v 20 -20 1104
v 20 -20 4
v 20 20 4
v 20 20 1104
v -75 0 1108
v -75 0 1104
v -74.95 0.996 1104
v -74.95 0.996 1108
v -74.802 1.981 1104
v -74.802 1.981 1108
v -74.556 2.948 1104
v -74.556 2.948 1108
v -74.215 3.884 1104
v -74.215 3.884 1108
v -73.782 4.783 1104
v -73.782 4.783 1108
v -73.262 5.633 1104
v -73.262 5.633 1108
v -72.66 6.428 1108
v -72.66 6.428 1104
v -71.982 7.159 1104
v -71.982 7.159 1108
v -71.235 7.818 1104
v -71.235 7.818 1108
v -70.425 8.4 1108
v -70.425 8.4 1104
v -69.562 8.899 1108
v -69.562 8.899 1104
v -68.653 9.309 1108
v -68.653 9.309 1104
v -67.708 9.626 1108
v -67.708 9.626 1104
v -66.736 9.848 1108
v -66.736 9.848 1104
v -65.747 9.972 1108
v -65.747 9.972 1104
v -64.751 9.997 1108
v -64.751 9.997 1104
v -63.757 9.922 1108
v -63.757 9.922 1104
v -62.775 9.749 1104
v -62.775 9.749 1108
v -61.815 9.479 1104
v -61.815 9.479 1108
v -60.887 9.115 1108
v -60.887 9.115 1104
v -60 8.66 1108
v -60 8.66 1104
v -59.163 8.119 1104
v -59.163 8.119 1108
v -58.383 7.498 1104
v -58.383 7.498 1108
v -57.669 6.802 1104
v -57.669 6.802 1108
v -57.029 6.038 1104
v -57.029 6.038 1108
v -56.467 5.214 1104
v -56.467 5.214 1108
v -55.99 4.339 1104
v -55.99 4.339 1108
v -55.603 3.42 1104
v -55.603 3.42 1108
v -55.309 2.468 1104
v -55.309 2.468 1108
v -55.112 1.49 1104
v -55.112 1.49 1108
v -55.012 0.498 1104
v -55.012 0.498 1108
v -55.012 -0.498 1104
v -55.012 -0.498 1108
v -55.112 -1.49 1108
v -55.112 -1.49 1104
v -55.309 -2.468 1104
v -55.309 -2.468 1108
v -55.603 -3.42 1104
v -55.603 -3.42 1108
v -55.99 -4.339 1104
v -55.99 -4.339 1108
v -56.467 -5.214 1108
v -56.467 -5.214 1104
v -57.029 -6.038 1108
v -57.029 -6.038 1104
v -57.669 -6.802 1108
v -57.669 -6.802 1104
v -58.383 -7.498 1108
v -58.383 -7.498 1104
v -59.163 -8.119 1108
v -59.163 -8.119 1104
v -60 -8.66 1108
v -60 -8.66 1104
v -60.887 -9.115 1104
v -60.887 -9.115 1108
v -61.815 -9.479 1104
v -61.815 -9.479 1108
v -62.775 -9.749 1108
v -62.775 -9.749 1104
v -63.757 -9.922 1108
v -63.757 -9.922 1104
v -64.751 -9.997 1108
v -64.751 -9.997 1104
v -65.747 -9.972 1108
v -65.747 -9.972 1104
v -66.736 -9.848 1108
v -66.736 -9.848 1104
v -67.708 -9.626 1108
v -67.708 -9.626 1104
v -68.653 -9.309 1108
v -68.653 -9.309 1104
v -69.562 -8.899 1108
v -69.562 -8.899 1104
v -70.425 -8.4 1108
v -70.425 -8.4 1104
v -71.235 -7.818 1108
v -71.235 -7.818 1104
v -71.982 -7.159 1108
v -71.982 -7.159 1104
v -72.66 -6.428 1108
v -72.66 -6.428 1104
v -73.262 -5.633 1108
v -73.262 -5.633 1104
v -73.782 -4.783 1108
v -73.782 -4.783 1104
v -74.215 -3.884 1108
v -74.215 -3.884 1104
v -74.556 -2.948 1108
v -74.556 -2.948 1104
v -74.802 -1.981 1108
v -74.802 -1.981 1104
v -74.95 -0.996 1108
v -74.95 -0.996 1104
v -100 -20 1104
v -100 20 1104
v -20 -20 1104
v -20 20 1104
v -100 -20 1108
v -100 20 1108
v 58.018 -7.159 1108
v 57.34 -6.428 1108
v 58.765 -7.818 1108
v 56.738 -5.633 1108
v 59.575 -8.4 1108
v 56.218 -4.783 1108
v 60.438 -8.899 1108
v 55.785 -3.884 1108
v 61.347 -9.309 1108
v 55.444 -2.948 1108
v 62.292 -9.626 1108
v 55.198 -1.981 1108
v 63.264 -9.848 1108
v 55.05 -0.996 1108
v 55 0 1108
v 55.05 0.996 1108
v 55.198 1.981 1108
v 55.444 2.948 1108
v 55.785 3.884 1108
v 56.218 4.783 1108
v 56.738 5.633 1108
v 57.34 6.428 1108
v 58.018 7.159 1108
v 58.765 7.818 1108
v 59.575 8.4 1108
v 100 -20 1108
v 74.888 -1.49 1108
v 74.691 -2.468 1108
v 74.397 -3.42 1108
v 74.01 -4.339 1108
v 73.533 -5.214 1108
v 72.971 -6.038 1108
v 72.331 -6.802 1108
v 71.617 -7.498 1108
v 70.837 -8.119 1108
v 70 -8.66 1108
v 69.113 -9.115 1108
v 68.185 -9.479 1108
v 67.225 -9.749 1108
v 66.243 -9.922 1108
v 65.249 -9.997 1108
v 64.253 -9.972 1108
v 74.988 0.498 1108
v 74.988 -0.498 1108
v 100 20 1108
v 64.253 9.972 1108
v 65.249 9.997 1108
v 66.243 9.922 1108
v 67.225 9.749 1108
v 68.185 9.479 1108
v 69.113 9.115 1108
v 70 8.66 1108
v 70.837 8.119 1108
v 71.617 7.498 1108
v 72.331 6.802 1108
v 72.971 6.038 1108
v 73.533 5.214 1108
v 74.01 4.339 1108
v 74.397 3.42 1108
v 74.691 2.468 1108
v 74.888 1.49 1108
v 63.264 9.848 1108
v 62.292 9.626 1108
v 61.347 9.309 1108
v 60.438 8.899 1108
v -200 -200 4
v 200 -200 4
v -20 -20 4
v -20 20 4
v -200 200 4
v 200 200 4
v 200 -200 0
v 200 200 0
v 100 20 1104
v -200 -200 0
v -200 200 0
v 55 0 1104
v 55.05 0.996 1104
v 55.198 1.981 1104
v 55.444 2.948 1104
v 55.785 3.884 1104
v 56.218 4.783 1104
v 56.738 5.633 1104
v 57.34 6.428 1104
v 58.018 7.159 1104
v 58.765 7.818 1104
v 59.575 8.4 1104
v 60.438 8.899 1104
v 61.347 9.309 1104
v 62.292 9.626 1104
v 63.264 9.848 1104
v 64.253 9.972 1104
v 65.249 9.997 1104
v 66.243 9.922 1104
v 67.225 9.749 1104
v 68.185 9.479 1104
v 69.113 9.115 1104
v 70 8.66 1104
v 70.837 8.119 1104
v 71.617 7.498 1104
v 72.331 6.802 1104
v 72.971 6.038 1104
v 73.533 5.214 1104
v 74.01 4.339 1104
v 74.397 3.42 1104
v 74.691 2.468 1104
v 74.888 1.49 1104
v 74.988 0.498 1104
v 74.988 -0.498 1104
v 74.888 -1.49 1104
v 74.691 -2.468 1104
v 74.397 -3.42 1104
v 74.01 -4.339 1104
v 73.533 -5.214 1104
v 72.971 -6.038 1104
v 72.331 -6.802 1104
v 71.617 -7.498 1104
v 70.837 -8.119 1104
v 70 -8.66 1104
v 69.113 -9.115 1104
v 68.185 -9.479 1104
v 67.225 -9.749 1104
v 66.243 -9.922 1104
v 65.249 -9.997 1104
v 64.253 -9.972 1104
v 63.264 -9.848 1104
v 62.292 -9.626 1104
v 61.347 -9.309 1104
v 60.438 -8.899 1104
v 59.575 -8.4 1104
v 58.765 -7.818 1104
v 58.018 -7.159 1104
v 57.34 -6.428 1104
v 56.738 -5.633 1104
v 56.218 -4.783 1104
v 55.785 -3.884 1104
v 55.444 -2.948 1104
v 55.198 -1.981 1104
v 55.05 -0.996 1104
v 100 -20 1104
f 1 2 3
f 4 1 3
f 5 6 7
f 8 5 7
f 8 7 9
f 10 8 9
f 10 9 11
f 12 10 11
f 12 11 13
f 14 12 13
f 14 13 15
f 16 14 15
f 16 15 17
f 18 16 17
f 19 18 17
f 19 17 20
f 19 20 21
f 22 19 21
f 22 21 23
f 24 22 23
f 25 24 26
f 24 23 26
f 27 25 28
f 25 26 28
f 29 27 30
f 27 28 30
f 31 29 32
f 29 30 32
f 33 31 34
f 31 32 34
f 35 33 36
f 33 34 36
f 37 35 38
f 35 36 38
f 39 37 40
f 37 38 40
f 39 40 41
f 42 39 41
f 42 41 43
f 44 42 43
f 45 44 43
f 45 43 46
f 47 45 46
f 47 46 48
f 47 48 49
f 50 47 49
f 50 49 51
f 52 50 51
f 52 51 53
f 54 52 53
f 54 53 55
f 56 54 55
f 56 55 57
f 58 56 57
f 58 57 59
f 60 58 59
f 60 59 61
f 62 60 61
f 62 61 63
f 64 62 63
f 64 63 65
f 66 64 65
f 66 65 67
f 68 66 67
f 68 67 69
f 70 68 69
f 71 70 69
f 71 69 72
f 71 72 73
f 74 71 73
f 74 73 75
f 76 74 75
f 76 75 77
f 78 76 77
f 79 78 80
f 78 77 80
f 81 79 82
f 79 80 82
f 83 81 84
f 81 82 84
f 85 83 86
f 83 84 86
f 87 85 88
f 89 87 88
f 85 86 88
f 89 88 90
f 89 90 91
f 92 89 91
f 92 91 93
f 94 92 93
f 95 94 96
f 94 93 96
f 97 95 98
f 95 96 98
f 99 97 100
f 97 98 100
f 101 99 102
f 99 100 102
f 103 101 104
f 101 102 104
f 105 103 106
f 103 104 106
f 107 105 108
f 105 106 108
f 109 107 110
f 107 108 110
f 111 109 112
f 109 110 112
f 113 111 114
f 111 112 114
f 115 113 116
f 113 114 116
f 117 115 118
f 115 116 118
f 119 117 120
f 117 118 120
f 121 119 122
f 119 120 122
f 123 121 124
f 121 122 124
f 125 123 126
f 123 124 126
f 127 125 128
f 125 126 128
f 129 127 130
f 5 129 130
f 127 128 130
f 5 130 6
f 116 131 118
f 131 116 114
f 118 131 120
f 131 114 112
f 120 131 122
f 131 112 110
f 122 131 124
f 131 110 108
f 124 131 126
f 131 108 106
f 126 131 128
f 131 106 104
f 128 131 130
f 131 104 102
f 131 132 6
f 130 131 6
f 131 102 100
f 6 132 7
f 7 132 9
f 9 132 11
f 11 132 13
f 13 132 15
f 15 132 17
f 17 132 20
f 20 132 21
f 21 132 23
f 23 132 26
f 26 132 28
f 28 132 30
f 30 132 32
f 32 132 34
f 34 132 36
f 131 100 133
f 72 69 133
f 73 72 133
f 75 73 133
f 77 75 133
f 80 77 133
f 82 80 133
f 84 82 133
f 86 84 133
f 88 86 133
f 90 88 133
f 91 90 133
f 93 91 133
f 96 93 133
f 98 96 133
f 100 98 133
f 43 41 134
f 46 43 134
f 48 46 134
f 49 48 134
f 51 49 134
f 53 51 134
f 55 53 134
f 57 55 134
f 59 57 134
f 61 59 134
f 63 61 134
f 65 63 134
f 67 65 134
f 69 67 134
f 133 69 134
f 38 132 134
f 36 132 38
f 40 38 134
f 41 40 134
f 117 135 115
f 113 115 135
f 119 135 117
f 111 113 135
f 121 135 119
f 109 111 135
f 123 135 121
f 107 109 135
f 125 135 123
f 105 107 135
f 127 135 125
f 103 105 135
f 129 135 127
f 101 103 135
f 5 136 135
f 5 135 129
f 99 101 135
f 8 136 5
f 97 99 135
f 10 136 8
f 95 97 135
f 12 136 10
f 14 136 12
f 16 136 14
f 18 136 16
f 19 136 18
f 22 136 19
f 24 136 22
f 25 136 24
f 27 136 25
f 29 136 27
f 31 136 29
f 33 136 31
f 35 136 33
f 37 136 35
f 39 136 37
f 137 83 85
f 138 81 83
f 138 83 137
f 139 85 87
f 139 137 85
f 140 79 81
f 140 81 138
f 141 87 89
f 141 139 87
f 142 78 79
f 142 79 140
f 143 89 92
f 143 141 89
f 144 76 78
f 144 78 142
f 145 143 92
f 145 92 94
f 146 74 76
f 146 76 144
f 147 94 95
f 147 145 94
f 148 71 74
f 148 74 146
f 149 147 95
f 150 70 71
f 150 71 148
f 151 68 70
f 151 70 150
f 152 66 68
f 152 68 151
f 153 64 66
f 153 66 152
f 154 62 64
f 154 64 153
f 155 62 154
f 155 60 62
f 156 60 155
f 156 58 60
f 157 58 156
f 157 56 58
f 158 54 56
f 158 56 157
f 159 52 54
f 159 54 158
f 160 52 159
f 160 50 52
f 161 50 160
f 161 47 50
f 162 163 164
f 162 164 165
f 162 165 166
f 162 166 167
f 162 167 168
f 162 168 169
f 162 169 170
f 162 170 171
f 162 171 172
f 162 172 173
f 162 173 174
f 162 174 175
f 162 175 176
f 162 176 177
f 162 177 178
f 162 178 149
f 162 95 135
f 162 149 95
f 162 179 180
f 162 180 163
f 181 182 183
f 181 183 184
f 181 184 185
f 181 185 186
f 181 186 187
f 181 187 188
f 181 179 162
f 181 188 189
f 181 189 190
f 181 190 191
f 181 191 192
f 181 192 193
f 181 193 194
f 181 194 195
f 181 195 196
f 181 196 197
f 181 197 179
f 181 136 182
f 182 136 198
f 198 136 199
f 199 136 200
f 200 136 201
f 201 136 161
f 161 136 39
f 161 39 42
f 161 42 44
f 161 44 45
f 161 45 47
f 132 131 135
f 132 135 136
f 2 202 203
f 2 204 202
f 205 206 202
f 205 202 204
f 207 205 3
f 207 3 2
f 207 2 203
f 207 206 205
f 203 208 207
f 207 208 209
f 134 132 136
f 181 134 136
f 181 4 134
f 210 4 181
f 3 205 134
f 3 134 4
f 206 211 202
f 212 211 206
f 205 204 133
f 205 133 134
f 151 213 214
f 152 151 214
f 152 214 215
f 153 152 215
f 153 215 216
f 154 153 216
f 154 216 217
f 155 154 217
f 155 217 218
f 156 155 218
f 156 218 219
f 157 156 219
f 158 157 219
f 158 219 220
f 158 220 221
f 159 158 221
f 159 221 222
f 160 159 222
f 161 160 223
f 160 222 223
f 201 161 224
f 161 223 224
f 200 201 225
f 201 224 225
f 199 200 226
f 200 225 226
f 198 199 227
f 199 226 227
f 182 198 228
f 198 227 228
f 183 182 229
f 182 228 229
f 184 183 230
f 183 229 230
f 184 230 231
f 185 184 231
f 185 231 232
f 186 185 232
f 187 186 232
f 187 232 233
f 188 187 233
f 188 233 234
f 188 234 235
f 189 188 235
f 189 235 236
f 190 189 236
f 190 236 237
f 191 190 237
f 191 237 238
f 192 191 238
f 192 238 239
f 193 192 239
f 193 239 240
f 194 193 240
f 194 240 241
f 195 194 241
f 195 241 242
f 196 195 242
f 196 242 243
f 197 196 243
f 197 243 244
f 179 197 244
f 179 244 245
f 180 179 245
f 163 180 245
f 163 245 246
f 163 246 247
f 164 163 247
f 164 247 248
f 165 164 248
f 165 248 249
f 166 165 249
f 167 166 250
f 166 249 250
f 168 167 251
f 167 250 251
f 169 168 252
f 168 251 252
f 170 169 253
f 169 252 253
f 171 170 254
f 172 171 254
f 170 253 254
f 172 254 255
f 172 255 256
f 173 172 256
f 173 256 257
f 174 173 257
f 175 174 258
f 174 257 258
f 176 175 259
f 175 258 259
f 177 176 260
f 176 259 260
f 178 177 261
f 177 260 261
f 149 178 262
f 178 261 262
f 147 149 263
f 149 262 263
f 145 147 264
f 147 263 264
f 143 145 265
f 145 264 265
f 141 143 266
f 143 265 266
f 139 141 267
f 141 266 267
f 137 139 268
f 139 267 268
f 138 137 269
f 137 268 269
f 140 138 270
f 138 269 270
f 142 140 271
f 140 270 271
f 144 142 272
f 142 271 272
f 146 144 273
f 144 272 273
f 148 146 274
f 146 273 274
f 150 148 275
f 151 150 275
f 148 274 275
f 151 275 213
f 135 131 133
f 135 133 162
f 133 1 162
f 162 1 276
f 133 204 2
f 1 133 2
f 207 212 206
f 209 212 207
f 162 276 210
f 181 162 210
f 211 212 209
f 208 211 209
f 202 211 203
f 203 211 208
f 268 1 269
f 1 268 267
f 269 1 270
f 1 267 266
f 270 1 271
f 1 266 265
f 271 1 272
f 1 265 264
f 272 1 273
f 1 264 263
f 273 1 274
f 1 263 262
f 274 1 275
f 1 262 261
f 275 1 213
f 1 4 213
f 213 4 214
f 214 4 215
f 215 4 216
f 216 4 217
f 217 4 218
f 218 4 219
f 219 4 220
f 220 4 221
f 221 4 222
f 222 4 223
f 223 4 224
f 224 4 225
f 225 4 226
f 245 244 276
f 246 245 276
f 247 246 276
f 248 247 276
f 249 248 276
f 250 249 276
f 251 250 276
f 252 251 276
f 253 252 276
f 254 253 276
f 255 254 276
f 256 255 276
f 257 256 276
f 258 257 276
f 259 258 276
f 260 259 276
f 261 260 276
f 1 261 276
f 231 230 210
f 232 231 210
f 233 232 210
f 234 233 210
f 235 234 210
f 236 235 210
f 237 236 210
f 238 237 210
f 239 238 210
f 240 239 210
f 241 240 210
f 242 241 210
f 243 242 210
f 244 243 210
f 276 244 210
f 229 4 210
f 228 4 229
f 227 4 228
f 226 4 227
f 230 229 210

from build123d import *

# Parameters (mm, degrees)
F0_W     = 400
F0_H     = 400
F1_DEPTH = 4
F2_W     = 40
F2_H     = 40
F3_DEPTH = 1100
F4_W     = 200
F4_H     = 40
F5_DEPTH = 4
F8_D     = 20
F8_DEPTH = 20
F9_D     = 20
F9_DEPTH = 20


with BuildPart() as f1:
    # F0 (on Top) → F1 (new body)
    with BuildSketch(Plane.XY):
        Rectangle(F0_W, F0_H)
    extrude(amount=F1_DEPTH)

    # F2 (on face) → F3 (join)
    with BuildSketch(Plane.XY.offset(4)):
        Rectangle(F2_W, F2_H)
    extrude(amount=F3_DEPTH)

    # F4 (on face) → F5 (join)
    with BuildSketch(Plane.XY.offset(1104)):
        Rectangle(F4_W, F4_H)
    extrude(amount=F5_DEPTH)

    # F8
    with Locations(Plane.XY.offset(1108)):
        with Locations((-65, 0)):
            Hole(F8_D / 2, depth=F8_DEPTH)

    # F9
    with Locations(Plane.XY.offset(1108)):
        with Locations((65, 0)):
            Hole(F9_D / 2, depth=F9_DEPTH)


solid = f1.part
